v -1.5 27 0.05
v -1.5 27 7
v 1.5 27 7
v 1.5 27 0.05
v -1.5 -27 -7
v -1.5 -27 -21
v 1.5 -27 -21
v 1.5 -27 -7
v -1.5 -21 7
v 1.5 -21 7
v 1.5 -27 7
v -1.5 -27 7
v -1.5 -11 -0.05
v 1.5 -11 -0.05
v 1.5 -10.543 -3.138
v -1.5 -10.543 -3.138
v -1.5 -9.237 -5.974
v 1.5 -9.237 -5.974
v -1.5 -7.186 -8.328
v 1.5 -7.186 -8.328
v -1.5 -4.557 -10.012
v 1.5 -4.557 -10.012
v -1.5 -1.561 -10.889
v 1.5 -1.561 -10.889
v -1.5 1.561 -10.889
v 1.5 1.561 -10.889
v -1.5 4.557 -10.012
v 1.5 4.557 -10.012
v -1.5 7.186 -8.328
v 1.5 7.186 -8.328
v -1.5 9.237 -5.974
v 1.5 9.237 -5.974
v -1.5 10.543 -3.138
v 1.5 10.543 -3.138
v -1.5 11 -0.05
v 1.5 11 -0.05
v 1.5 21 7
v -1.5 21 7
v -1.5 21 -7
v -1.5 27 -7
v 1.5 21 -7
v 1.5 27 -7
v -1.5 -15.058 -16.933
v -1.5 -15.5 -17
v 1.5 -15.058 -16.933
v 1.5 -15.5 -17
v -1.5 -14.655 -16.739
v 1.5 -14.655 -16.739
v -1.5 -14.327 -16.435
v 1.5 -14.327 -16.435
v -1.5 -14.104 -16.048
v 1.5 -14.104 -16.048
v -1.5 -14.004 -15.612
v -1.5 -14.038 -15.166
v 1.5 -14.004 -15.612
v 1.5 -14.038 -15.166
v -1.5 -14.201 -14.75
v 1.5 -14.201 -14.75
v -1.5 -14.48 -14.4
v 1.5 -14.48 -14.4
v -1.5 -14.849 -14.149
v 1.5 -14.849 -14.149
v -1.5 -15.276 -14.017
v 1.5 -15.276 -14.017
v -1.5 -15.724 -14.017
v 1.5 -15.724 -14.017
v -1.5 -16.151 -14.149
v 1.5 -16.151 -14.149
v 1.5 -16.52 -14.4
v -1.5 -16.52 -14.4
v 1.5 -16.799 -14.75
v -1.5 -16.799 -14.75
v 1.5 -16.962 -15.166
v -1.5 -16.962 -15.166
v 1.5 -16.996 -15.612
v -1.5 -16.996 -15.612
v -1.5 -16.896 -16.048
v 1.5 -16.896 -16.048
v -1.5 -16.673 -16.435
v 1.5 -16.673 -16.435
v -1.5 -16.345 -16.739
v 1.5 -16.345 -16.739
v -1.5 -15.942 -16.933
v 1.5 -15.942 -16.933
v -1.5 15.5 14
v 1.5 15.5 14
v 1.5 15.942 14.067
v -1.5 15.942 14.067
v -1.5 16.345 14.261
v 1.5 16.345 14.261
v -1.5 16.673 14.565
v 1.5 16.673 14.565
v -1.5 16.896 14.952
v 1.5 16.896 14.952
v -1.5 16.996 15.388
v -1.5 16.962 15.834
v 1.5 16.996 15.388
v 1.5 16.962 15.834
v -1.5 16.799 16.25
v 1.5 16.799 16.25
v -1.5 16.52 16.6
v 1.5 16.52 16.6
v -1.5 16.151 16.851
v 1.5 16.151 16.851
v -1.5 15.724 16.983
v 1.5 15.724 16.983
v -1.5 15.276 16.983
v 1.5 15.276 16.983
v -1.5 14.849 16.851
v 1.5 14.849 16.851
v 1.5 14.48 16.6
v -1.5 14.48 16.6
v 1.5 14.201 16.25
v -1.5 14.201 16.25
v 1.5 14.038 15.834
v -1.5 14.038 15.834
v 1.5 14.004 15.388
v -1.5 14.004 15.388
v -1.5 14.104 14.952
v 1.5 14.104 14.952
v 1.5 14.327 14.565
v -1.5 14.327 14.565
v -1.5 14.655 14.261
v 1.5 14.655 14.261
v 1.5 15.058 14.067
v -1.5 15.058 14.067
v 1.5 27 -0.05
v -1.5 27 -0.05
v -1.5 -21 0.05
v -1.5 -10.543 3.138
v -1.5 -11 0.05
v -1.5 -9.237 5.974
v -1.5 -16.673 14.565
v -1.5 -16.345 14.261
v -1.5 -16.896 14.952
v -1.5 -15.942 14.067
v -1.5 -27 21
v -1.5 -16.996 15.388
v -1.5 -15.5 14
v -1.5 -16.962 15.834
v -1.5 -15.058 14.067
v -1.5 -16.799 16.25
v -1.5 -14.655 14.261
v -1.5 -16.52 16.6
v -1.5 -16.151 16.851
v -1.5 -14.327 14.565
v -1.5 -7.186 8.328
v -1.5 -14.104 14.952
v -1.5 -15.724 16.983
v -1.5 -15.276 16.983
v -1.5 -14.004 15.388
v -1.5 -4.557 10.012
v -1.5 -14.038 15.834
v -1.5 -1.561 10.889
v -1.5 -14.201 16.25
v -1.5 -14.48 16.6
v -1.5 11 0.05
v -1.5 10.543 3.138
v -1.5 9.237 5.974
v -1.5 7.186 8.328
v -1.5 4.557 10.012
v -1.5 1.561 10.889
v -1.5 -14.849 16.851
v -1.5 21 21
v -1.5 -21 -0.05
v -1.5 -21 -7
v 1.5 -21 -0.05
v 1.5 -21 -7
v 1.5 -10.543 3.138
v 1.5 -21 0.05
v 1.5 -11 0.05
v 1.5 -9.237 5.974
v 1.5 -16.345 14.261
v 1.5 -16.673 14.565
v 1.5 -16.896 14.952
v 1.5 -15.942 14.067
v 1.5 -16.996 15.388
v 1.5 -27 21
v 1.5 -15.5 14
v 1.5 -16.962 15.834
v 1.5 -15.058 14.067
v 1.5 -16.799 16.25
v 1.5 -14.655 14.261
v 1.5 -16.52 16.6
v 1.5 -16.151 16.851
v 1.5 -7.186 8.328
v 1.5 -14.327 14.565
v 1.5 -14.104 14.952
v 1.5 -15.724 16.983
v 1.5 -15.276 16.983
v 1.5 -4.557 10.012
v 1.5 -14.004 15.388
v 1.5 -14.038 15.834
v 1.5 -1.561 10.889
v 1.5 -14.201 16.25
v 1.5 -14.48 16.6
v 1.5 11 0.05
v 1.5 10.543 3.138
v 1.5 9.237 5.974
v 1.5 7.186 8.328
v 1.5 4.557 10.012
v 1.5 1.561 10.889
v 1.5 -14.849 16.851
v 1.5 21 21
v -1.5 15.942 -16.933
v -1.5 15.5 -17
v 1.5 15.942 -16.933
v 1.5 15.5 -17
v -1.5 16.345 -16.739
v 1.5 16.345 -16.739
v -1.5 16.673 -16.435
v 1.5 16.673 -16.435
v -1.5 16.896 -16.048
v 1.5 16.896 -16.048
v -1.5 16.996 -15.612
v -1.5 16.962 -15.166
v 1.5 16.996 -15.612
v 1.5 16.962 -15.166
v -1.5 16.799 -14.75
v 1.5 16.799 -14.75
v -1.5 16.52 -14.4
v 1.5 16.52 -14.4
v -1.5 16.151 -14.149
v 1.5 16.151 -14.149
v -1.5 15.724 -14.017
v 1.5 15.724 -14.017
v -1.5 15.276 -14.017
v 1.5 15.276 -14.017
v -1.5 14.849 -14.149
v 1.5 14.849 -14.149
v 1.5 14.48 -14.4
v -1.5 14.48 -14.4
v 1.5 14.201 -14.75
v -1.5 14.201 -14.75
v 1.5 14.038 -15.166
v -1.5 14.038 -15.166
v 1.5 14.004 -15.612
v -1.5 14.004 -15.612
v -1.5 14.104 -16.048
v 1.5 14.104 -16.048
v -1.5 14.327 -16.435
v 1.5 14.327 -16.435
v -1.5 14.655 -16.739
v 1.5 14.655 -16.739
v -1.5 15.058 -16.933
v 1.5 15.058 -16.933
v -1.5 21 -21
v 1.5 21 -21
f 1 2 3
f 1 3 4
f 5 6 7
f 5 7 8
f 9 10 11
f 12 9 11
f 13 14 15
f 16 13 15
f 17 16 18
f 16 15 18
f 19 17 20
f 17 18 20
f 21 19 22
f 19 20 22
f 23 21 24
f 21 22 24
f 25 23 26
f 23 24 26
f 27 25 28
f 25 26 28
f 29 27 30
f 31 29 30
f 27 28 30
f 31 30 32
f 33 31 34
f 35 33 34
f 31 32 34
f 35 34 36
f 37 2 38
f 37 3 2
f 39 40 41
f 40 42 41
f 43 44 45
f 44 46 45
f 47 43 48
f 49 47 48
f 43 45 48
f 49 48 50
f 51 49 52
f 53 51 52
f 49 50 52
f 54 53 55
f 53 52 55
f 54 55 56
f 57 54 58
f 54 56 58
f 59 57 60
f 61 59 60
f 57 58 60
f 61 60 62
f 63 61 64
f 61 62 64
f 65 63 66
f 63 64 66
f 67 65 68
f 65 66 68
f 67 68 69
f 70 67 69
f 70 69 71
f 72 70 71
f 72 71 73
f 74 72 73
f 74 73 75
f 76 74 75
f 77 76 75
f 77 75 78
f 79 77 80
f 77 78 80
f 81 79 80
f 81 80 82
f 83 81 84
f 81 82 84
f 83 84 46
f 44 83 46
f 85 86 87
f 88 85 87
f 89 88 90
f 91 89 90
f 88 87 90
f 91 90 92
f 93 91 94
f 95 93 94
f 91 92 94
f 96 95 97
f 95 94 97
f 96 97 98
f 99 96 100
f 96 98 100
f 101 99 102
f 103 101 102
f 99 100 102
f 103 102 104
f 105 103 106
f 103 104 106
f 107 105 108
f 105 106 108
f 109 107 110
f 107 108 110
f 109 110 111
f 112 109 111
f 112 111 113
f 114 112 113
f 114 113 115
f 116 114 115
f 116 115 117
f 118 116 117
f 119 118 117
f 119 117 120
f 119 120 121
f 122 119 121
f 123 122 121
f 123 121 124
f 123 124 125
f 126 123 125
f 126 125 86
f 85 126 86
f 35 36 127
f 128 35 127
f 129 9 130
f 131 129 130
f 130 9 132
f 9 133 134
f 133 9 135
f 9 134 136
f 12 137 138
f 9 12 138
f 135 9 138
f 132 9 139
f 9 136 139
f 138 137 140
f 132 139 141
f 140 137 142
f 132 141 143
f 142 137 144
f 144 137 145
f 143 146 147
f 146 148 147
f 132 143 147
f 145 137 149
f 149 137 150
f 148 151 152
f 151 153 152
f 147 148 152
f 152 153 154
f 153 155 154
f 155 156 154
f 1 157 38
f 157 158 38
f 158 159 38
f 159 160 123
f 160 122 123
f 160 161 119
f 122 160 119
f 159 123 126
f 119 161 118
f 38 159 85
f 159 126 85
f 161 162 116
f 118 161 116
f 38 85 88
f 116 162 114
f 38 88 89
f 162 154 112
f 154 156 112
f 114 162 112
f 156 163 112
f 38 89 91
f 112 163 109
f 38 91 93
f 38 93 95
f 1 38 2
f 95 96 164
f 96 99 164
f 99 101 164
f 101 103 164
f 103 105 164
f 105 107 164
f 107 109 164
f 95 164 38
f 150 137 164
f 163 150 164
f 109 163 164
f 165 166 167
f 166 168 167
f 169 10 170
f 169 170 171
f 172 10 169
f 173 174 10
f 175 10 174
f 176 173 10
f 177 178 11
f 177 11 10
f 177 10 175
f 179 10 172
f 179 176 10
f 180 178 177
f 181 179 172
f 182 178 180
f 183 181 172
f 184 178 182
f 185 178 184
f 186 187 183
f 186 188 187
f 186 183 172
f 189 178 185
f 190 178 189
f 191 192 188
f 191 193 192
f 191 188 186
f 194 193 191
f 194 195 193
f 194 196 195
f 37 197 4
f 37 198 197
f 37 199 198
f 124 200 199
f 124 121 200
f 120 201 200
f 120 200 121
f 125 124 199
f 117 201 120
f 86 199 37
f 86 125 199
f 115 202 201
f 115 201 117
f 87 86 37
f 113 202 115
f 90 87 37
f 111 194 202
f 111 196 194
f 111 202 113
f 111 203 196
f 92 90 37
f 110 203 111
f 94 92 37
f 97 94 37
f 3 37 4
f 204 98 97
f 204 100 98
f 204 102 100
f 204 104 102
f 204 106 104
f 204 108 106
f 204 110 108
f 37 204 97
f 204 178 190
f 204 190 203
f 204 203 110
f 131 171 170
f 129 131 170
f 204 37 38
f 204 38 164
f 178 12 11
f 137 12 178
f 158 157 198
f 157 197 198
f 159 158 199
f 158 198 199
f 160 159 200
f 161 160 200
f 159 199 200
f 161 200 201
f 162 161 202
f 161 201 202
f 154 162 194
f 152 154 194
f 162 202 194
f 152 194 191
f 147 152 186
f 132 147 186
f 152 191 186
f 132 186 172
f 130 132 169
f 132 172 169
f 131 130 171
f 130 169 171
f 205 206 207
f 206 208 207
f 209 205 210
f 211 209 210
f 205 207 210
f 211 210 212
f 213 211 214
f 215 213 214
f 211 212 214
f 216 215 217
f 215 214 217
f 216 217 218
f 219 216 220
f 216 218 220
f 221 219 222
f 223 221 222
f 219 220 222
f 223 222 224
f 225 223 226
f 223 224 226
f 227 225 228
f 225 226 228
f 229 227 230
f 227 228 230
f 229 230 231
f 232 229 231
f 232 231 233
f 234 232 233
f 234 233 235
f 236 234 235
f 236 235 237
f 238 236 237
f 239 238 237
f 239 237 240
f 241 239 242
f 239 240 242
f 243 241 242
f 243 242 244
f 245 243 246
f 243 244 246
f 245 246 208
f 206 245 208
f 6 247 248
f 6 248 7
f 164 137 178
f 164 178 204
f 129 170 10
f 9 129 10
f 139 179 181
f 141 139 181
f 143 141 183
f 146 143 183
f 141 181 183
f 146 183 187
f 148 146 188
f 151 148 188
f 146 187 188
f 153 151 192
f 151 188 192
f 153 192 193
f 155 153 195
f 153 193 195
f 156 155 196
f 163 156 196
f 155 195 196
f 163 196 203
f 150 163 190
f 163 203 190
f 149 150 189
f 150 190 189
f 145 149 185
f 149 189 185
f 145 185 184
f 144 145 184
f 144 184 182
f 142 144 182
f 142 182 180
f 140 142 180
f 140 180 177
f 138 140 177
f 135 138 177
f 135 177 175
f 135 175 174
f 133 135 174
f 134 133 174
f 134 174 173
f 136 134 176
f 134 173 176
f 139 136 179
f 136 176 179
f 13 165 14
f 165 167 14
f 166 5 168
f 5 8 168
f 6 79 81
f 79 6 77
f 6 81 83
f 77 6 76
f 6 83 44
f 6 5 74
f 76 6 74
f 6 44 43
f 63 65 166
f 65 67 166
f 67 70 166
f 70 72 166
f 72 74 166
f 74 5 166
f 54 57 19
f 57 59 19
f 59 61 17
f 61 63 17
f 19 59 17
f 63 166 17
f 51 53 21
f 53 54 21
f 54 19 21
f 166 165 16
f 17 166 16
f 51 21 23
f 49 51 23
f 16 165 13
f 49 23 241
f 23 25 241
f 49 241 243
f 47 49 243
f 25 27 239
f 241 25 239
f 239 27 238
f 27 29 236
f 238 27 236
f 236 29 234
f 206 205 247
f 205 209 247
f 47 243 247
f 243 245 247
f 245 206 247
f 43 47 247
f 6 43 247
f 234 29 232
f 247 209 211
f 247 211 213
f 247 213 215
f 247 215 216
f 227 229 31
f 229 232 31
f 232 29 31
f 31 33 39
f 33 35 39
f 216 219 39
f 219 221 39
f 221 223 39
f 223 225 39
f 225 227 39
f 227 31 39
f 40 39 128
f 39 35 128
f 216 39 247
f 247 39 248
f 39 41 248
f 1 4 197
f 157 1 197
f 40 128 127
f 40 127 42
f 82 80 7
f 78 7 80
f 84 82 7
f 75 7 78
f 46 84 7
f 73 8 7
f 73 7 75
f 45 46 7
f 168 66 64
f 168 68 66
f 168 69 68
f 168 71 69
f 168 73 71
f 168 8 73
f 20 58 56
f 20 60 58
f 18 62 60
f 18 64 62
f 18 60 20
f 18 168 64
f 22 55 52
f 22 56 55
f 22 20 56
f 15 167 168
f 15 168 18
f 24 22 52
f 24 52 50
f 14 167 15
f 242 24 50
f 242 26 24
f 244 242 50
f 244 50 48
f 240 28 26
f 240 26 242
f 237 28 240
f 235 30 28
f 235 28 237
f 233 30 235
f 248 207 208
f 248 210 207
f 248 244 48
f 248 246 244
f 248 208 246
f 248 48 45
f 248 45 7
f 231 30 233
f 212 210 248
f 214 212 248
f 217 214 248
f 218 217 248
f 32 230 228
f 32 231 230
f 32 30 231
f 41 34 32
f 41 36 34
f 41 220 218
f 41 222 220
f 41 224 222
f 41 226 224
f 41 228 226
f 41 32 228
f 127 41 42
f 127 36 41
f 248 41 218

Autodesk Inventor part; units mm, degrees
ref_plane "YZ Plane" through (0, 0, 0) normal (1, 0, 0) x (0, 1, 0)
ref_plane "XZ Plane" through (0, 0, 0) normal (0, 1, 0) x (-1, 0, 0)
ref_plane "XY Plane" through (0, 0, 0) normal (0, 0, 1) x (1, 0, 0)
sketch "Esboço1" plane through (0, 0, 0) normal (1, 0, 0) x (0, 1, 0)
  line L0 (-27, 21) -> (27, 21)
  line L1 (27, 21) -> (27, -21)
  line L2 (27, -21) -> (-27, -21)
  line L3 (-27, -21) -> (-27, 21)
  line L4 (-27, 21) -> (27, -21) construction
  line L5 (27, 21) -> (-27, -21) construction
  point P0 (0, 0)
  dimension "d0" = 42
  dimension "d1" = 54
extrude "Extrusão1" add sketch "Esboço1" along normal mid plane 3
sketch "Esboço2" plane through (1.5, 0, 0) normal (1, 0, 0) x (0, 0, -1)
  circle A0 centre (0, 0) radius 11
  dimension "d4" = 22
extrude "Extrusão2" cut sketch "Esboço2" against normal through all
sketch "Esboço3" plane through (1.5, 0, 0) normal (1, 0, 0) x (0, 0, -1)
  circle A0 centre (-15.5, 15.5) radius 1.5
  line L0 (-21, 27) -> (-21, -27) projected
  line L1 (21, 27) -> (-21, 27) projected
  point P0 (0, 0)
  dimension "d7" = 5.5
  dimension "d8" = 3
  dimension "d9" = 11.5
extrude "Extrusão3" cut sketch "Esboço3" against normal through all
pattern_linear "Padrão retangular1" count 2 spacing 31 along (0, 0, -1) count 2 spacing 31 along (0, -1, 0) of "Extrusão3"
sketch "Esboço4" plane through (1.5, 0, 0) normal (1, 0, 0) x (0, 0, -1)
  line L0 (21, -27) -> (21, 27) projected
  circle A0 centre (15.5, 15.5) radius 1.5 projected
  line L1 (-21, 27) -> (-21, -27) projected
  circle A1 centre (-15.5, 15.5) radius 1.5 projected
  circle A2 centre (15.5, -15.5) radius 1.5 projected
  circle A3 centre (-15.5, -15.5) radius 1.5 projected
  line L2 (21, 27) -> (-21, 27) projected
  line L3 (-21, -27) -> (21, -27) projected
  point P0 (0, 0)
  dimension "d18" = 5.5
  dimension "d19" = 5.5
  dimension "d20" = 5.5
  dimension "d21" = 5.5
  dimension "d22" = 11.5
  dimension "d23" = 11.5
  dimension "d24" = 11.5
  dimension "d25" = 11.5
  dimension "d26" = 31
  dimension "d27" = 31
  dimension "d28" = 31
  dimension "d29" = 31
sketch "Esboço5" plane through (1.5, 0, 0) normal (1, 0, 0) x (0, 0, -1)
  line L0 (21, 27) -> (-21, 27) projected
  line L1 (-21, 27) -> (-7, 27)
  line L2 (-7, 27) -> (-7, 21)
  line L3 (-7, 21) -> (-21, 21)
  line L4 (-21, 21) -> (-21, 27)
  line L5 (21, 27) -> (7, 27)
  line L6 (7, 27) -> (7, 21)
  line L7 (7, 21) -> (21, 21)
  line L8 (21, 21) -> (21, 27)
  line L9 (-7, -33) -> (7, -33)
  line L10 (7, -33) -> (7, -21)
  line L11 (7, -21) -> (-7, -21)
  line L12 (-7, -21) -> (-7, -33)
  line L13 (-21, -27) -> (21, -27) projected
  line L14 (-7, -33) -> (7, -21) construction
  line L15 (7, -33) -> (-7, -21) construction
  line L16 (-21, 27) -> (-21, -27) projected
  line L17 (21, -27) -> (21, 27) projected
  point P0 (0, 0)
  point P1 (0, -27)
  point P2 (-7, -27)
  point P3 (7, -27)
  point P4 (7, 27)
  point P5 (-7, 27)
  dimension "d30" = 14
  dimension "d31" = 14
  dimension "d32" = 6
  dimension "d33" = 6
  dimension "d34" = 14
  dimension "d35" = 14
  dimension "d36" = 12
  dimension "d37" = 14
  dimension "d38" = 14
  dimension "d39" = 6
extrude "Extrusão4" cut sketch "Esboço5" against normal through all contours L8 L7 L6 L0 | L2 L3 L4 L0 | L13 L12 L11 L10
sketch "Esboço6" plane through (1.5, 0, 0) normal (1, 0, 0) x (0, 0, -1)
  line L0 (-0.05, -30) -> (0.05, -30)
  line L1 (0.05, -30) -> (0.05, 30)
  line L2 (0.05, 30) -> (-0.05, 30)
  line L3 (-0.05, 30) -> (-0.05, -30)
  line L4 (-0.05, -30) -> (0.05, 30) construction
  line L5 (0.05, -30) -> (-0.05, 30) construction
  point P0 (0, 0)
  dimension "d44" = 60
  dimension "d45" = 0.1
extrude "Extrusão5" cut sketch "Esboço6" against normal through all
properties part number "suporte do motor"
